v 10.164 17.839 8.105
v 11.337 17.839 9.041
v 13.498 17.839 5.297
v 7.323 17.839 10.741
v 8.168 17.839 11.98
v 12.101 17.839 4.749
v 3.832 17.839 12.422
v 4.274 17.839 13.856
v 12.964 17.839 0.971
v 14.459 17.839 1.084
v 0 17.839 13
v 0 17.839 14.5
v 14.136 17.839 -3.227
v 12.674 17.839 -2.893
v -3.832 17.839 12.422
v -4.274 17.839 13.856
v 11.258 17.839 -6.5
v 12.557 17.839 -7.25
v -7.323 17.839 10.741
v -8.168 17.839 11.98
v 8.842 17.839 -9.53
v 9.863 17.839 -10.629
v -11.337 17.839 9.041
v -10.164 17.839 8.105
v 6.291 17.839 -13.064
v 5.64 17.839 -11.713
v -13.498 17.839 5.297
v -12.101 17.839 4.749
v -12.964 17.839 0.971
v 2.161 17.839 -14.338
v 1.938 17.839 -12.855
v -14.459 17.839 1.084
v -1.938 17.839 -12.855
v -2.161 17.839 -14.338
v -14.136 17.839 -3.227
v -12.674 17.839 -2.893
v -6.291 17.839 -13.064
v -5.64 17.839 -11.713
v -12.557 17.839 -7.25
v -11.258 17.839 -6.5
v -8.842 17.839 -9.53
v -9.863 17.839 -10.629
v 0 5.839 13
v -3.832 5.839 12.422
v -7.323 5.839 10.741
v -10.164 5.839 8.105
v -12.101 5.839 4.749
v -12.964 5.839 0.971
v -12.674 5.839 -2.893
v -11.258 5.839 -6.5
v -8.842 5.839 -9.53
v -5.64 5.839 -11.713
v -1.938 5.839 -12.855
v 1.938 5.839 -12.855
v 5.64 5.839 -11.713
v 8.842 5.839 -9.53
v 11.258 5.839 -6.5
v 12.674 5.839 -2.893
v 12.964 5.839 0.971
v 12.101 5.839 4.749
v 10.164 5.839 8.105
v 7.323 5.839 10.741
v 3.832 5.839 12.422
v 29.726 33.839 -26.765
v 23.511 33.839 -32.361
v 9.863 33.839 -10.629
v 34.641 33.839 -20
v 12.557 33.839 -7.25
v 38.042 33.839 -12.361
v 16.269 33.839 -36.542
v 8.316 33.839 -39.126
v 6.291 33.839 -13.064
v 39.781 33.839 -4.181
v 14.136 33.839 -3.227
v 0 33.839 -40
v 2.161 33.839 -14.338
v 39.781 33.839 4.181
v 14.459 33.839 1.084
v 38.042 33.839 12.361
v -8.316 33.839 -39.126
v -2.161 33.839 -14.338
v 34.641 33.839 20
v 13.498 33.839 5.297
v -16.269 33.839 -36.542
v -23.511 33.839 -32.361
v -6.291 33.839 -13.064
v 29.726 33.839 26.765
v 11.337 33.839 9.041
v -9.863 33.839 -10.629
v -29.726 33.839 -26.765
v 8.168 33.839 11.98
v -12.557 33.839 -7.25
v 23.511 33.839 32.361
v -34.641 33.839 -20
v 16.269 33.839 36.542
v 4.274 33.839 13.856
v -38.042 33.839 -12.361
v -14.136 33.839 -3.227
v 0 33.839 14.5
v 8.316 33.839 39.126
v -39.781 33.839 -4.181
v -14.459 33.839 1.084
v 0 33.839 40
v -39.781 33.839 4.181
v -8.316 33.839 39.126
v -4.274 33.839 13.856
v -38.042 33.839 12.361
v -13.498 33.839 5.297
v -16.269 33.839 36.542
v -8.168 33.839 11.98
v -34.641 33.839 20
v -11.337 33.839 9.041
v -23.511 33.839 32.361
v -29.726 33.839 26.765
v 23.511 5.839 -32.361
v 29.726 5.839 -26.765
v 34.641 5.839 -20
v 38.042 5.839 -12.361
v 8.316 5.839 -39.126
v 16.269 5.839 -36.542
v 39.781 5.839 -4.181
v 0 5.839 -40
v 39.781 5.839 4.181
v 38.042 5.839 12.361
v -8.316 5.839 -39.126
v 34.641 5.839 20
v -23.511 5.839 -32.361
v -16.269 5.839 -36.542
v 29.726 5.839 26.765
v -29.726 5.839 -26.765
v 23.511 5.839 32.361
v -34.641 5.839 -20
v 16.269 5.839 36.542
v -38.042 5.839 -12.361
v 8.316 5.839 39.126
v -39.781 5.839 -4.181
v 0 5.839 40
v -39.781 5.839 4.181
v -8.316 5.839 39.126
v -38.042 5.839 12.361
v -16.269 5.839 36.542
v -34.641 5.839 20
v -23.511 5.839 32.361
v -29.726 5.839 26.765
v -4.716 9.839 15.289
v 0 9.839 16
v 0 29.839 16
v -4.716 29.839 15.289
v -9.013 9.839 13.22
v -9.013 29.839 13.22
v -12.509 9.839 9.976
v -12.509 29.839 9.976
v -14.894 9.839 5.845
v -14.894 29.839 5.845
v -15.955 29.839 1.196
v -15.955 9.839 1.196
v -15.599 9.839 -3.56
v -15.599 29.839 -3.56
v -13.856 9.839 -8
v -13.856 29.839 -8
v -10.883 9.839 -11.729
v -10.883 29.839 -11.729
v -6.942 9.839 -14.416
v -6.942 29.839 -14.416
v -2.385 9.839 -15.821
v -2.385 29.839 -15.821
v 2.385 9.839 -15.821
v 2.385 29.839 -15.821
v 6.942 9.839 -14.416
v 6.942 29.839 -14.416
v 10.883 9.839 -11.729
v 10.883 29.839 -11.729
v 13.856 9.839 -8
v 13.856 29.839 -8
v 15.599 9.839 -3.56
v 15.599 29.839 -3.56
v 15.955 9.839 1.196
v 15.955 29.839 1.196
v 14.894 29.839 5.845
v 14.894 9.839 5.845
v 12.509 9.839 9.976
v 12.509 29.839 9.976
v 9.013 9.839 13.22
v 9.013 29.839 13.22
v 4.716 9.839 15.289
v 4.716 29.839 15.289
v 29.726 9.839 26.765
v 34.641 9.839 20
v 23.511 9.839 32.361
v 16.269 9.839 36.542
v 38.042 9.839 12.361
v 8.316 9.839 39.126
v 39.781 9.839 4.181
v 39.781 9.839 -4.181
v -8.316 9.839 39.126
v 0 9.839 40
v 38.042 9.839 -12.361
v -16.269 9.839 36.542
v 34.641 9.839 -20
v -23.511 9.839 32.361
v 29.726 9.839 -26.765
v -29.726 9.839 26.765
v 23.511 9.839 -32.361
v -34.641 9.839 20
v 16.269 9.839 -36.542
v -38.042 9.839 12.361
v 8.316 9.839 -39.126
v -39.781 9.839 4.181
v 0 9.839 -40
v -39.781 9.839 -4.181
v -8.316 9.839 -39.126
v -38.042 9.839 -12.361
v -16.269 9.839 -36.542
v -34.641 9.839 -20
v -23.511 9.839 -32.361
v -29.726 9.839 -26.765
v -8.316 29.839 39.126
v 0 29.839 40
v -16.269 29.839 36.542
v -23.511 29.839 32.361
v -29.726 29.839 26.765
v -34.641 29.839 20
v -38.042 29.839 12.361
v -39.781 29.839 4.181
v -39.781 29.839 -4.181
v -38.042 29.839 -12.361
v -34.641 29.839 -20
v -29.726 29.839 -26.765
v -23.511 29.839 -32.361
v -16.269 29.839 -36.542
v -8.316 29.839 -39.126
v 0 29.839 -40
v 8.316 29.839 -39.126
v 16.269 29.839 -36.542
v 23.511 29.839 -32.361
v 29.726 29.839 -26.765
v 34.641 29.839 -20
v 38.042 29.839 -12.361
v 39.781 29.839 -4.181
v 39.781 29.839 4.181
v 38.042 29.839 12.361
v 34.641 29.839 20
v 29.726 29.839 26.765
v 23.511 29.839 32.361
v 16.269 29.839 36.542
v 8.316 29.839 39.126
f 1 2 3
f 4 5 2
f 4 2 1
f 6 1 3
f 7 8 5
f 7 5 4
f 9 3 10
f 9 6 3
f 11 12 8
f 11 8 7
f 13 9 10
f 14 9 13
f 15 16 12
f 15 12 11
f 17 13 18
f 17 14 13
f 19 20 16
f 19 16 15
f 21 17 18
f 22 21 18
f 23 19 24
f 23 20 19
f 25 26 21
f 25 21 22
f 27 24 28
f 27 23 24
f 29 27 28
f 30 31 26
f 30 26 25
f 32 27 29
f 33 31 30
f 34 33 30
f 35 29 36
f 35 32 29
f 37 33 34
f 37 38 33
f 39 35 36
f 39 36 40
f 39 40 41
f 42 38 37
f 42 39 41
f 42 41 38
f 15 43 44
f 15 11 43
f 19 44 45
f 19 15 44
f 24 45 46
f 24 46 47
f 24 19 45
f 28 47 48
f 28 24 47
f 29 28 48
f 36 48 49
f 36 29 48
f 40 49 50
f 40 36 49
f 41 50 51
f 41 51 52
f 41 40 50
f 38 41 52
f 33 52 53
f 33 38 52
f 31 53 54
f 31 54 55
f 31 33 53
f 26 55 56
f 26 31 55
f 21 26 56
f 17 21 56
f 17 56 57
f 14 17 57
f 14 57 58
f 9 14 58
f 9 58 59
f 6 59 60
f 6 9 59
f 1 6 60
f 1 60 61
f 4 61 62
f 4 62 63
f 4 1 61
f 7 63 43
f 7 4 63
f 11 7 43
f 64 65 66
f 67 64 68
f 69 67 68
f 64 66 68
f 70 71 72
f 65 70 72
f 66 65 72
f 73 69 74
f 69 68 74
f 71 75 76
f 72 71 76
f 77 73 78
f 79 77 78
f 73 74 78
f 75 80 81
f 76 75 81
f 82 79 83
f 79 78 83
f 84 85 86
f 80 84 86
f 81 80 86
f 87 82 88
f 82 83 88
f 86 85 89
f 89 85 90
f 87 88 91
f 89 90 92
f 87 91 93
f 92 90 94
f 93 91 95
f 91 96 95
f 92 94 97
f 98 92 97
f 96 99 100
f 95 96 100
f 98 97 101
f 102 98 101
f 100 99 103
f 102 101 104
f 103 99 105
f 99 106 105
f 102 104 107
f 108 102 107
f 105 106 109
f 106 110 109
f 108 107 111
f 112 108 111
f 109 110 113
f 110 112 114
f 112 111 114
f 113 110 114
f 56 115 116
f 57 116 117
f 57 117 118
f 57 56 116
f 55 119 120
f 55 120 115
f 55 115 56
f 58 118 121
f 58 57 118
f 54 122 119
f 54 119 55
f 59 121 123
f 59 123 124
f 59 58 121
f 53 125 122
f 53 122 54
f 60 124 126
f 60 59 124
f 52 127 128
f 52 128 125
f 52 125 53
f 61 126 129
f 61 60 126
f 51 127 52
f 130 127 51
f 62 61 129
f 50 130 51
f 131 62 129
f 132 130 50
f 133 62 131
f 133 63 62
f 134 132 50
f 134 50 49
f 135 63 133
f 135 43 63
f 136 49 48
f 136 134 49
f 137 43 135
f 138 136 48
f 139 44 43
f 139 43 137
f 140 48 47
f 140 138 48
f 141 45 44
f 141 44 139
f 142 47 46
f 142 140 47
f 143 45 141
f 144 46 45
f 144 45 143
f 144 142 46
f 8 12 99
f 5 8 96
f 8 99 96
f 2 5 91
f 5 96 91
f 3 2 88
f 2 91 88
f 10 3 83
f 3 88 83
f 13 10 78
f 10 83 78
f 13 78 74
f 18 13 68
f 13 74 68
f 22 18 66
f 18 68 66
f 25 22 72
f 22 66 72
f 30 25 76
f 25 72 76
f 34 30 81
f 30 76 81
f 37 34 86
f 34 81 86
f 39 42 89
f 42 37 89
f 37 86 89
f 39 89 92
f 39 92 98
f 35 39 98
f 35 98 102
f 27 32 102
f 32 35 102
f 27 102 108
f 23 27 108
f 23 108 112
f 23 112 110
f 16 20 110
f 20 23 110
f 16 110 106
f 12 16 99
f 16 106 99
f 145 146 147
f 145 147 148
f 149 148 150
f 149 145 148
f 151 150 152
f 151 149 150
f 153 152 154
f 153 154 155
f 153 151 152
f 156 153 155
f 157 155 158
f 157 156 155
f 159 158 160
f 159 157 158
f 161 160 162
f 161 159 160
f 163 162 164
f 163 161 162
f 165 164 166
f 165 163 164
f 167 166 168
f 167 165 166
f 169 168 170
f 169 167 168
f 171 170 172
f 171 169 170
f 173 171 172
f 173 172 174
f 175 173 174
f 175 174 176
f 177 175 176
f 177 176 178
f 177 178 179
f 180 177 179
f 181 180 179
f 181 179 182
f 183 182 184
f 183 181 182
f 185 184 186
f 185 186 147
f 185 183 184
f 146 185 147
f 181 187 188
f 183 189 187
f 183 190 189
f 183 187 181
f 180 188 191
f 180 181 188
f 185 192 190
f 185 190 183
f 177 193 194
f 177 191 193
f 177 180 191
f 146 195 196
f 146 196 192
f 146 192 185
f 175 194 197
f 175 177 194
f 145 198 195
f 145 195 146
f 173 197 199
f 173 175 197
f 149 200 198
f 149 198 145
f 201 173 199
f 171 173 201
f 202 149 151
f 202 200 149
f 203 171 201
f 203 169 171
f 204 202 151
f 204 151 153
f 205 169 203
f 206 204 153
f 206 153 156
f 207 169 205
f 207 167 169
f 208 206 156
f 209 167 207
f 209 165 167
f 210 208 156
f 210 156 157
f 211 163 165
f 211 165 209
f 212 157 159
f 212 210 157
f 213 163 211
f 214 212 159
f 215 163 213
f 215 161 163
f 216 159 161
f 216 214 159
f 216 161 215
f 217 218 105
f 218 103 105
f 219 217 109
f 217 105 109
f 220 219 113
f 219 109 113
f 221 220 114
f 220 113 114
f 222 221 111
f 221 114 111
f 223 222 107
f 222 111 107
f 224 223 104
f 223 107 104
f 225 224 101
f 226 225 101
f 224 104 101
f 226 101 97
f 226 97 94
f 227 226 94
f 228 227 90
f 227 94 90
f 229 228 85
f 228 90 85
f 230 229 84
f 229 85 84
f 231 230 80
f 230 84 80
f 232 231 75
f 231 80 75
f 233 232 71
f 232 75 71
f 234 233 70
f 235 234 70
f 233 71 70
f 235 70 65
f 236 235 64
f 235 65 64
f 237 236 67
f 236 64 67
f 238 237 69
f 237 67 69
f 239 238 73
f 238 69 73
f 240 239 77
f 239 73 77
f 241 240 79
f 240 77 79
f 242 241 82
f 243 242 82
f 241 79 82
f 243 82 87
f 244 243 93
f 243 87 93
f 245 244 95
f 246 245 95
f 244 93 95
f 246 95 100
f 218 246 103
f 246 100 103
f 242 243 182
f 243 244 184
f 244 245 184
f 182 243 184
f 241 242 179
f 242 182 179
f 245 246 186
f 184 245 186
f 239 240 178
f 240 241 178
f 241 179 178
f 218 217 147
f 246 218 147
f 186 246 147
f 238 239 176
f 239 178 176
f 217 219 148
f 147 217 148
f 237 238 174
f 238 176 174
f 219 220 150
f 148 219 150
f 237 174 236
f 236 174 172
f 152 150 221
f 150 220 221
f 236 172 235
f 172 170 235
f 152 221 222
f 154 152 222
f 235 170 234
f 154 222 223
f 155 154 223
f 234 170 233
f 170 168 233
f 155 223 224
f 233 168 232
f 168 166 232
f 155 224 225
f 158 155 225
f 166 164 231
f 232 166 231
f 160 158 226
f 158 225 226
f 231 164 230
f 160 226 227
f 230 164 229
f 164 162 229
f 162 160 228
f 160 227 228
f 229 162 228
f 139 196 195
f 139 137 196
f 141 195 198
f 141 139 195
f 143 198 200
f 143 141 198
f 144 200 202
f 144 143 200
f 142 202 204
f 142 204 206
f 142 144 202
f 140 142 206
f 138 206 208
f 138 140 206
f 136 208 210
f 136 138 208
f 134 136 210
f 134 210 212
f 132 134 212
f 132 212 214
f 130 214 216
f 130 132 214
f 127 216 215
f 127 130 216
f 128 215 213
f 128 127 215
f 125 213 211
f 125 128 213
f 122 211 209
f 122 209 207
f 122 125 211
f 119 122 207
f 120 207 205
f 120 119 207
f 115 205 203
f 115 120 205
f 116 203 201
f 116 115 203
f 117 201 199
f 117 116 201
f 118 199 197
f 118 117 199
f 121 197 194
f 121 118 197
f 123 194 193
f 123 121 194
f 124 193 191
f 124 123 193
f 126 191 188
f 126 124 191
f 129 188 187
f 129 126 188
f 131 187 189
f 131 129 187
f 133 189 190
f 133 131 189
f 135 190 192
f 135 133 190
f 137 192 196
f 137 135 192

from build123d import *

# Parameters (mm, degrees)
CUT_EXTRUDE1_START = 48
SKETCH2_R          = 14.5
CUT_EXTRUDE1_DEPTH = 48


with BuildPart() as part:
    # Sketch1 → Revolve1 (revolve)
    with BuildSketch(Plane(origin=(0, 0, 0), x_dir=(0, 0, -1), z_dir=(1, 0, 0))):
        Polygon((-16, 9.838658872), (-40, 9.838658872), (-40, 5.838658872), (-13, 5.838658872), (-13, 17.838658872), (-14.5, 17.838658872), (-14.5, 29.838658872), (-16, 29.838658872), align=None)
    revolve1 = revolve(axis=Axis((0, 28.058626224, 0), (0, -1, 0)))

    # Mirror3: Revolve1 across plane
    add(revolve1.mirror(Plane.ZX.offset(19.838658872)))

    # Sketch2 → Cut-Extrude1 (cut)
    with BuildSketch(Plane(origin=(0, 17.838658872, 0), x_dir=(1, 0, 0), z_dir=(0, 1, 0)).offset(CUT_EXTRUDE1_START)):
        with Locations(Location((0, 0, 0), (0, 0, 270))):
            Circle(SKETCH2_R)
    extrude(amount=-CUT_EXTRUDE1_DEPTH, mode=Mode.SUBTRACT)


solid = part.part
